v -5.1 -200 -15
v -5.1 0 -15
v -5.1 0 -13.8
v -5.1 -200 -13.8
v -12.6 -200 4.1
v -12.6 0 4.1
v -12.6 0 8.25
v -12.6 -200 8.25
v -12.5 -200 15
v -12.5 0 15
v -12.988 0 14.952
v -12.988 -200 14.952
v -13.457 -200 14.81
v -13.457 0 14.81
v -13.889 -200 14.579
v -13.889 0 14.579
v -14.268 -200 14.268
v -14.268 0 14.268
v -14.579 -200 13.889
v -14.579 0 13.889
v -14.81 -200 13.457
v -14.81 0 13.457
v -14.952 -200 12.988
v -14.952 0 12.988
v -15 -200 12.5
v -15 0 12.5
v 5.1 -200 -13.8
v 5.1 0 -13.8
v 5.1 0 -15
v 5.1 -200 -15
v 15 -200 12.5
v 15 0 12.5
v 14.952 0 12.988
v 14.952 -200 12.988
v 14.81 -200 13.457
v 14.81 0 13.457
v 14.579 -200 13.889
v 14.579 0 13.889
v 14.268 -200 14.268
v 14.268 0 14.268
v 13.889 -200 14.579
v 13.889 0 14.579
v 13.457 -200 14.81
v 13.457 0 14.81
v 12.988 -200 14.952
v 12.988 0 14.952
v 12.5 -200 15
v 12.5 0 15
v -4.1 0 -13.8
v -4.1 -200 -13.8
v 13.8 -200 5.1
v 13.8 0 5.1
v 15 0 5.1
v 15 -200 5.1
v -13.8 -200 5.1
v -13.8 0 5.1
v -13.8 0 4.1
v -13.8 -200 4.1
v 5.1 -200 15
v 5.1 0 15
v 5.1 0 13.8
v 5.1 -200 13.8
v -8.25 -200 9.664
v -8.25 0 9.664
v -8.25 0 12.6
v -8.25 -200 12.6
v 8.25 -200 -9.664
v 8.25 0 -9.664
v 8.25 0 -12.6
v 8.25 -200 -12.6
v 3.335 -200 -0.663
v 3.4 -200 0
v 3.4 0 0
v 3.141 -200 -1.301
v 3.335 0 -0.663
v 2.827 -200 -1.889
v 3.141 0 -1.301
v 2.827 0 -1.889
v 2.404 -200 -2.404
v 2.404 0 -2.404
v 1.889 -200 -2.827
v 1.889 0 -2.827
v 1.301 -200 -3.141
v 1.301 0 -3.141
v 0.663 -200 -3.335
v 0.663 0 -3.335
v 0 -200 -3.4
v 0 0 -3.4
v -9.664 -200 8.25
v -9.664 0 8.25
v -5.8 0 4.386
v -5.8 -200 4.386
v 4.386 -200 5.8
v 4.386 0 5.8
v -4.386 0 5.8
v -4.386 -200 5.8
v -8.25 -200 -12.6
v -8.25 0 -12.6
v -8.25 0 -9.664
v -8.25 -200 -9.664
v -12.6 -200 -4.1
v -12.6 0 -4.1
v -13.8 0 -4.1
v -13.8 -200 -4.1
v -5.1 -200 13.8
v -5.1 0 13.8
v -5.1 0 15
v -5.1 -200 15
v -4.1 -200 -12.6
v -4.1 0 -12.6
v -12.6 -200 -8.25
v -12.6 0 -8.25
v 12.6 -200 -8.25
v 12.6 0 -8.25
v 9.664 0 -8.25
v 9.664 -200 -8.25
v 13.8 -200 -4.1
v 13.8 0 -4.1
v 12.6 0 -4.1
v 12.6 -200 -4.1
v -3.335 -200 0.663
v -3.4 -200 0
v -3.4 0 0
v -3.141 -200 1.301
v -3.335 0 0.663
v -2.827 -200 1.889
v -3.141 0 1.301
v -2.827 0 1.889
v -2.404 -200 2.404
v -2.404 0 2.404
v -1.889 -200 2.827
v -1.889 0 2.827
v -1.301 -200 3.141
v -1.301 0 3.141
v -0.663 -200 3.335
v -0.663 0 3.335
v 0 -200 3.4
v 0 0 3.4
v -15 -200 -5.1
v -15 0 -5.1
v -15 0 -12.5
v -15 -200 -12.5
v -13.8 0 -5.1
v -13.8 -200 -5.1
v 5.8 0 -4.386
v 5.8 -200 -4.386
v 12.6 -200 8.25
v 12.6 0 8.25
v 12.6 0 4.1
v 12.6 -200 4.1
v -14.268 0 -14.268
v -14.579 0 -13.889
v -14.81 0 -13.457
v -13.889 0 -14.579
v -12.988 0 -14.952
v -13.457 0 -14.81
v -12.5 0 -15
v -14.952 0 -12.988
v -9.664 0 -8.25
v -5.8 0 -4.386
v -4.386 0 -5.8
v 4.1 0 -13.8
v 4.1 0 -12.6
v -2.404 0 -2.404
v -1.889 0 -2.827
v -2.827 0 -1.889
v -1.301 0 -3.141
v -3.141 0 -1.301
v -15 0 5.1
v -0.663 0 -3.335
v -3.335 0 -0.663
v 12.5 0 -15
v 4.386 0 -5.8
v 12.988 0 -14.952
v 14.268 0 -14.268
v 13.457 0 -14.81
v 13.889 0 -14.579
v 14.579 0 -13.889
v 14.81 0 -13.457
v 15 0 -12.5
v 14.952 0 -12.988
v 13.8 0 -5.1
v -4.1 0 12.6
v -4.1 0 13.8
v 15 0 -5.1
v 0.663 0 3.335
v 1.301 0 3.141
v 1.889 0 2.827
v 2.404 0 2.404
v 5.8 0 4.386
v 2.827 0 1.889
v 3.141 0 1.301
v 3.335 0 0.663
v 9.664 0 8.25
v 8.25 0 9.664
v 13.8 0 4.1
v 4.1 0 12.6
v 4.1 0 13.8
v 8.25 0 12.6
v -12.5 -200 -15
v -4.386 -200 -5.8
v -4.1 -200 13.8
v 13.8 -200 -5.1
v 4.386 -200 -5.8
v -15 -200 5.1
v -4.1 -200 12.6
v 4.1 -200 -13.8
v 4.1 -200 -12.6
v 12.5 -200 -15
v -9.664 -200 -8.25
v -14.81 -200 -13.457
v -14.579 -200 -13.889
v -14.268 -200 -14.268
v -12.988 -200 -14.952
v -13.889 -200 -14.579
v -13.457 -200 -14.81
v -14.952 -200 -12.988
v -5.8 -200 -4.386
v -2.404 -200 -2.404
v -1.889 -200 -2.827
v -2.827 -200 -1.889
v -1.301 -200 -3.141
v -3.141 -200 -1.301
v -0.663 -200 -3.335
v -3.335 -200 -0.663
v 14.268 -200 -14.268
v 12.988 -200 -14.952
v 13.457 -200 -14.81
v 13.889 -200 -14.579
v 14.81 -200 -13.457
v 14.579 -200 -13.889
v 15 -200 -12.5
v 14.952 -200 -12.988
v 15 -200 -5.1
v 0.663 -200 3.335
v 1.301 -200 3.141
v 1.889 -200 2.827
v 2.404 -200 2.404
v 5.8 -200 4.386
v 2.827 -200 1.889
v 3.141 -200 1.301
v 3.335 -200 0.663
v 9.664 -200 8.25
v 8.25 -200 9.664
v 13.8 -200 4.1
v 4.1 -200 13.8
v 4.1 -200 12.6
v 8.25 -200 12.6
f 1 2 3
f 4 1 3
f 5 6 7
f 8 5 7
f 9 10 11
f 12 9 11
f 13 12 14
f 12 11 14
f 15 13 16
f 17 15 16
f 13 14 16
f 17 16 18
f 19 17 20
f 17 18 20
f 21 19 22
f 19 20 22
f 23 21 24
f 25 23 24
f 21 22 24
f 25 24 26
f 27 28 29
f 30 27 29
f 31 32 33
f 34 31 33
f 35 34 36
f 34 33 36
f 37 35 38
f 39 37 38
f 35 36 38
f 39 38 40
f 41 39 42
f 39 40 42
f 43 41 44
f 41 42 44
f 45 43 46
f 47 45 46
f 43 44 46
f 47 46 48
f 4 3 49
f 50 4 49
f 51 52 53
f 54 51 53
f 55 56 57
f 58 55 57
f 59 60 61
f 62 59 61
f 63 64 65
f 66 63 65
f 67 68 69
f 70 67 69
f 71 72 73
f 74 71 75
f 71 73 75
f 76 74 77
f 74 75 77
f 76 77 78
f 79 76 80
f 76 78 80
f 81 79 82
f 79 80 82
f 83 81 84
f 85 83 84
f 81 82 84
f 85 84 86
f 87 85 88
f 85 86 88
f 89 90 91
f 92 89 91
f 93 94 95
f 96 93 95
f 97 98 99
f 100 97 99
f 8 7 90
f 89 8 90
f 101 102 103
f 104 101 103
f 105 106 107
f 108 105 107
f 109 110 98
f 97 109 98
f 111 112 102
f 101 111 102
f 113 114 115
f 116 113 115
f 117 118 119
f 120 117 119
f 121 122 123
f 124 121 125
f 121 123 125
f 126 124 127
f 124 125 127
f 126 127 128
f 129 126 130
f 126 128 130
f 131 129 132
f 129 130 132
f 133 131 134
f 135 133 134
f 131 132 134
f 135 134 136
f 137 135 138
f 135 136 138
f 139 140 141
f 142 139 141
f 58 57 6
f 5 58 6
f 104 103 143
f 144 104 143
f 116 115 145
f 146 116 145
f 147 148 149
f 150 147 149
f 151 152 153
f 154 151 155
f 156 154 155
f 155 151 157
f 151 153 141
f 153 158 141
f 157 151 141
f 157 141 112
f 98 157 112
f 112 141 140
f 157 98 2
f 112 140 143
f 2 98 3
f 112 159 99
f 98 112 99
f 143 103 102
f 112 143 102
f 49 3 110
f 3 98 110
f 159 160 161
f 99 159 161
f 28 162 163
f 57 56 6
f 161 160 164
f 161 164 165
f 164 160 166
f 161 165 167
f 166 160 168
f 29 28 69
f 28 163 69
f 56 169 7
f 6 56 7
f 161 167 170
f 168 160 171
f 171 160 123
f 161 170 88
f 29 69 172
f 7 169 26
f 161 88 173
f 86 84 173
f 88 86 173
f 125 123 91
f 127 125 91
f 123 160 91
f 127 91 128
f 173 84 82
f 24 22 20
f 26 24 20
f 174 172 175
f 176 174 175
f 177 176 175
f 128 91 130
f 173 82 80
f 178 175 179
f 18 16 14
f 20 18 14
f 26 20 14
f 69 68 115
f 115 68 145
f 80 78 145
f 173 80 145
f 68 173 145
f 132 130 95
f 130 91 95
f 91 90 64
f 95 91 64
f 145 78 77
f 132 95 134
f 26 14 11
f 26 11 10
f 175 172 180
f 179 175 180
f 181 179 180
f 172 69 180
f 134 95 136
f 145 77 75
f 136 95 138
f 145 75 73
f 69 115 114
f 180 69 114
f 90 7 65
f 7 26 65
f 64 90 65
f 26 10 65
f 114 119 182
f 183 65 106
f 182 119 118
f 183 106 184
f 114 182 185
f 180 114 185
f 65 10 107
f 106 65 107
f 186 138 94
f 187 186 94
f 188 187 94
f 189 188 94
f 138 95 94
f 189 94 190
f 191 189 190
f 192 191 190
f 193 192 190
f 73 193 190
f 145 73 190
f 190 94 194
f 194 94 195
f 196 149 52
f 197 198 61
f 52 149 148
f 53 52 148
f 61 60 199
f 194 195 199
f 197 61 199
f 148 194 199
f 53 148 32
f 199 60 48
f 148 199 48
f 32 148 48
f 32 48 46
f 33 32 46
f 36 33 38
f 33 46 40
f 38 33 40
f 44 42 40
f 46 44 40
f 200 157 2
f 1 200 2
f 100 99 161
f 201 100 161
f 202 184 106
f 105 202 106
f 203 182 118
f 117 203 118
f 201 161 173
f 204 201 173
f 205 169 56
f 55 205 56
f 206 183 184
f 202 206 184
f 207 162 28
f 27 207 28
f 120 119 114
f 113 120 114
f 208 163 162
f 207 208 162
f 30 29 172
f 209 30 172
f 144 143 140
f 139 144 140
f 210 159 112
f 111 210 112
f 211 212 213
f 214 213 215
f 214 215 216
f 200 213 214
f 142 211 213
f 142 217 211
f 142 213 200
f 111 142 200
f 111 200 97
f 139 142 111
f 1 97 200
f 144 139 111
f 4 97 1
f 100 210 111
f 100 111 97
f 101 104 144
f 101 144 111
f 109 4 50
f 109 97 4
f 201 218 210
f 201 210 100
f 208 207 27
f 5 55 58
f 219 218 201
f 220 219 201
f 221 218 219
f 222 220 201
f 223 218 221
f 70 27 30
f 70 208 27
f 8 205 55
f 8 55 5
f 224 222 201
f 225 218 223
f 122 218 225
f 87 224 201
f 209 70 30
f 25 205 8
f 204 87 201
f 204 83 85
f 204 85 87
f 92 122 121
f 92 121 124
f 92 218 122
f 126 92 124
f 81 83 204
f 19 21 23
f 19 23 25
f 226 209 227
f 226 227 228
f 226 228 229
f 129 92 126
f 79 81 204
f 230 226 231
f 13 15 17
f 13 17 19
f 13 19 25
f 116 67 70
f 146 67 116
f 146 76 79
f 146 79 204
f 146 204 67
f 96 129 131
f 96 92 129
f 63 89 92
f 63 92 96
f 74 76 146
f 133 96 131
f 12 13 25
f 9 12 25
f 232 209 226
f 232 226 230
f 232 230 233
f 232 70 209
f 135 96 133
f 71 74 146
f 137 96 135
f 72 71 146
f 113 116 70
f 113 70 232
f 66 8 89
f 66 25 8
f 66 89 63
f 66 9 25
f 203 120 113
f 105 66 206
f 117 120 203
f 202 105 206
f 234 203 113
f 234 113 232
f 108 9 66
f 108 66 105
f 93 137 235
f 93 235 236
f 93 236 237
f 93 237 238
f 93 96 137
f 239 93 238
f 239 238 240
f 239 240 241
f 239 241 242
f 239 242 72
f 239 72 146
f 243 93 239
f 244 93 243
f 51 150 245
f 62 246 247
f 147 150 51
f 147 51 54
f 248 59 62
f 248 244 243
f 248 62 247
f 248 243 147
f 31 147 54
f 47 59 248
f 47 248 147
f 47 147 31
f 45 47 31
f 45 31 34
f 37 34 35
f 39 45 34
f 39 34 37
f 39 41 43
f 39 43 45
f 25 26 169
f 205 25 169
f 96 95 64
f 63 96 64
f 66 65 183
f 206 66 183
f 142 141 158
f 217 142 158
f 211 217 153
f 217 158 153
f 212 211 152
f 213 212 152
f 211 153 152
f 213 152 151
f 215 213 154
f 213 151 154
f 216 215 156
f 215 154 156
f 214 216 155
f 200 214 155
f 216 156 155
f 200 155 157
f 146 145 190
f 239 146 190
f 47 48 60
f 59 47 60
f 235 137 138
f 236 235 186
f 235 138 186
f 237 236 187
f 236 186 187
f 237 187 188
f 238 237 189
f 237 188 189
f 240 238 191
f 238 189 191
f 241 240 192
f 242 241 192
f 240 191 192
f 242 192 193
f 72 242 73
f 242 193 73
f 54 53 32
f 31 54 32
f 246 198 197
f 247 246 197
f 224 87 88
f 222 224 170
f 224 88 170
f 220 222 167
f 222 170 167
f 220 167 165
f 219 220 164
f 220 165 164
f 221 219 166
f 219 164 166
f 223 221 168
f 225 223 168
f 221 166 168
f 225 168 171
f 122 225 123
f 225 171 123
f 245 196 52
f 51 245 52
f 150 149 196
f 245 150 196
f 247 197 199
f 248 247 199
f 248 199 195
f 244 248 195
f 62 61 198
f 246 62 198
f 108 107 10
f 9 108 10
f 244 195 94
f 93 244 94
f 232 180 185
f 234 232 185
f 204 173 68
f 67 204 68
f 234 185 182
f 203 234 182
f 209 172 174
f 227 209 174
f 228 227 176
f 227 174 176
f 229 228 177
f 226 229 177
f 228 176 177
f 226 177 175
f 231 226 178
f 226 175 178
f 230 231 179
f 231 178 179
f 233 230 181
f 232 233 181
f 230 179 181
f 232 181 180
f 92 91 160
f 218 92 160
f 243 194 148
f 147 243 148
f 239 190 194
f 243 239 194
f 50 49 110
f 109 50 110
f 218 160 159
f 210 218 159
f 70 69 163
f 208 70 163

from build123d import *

# Parameters (mm, degrees)
F1_DEPTH = 200


with BuildPart() as f1:
    # F0 (on Front) → F1 (new body)
    with BuildSketch(Plane.XZ):
        with BuildLine():
            Line((12.5, 15), (5.1, 15))
            Line((5.1, 15), (5.1, 13.8))
            Line((5.1, 13.8), (4.1, 13.8))
            Line((4.1, 13.8), (4.1, 12.6))
            Line((4.1, 12.6), (8.25, 12.6))
            Line((8.25, 12.6), (8.25, 9.664214))
            Line((8.25, 9.664214), (5.092893, 6.507107))
            Line((5.092893, 6.507107), (4.385786, 5.8))
            Line((4.385786, 5.8), (0, 5.8))
            Line((0, 5.8), (-4.385786, 5.8))
            Line((-4.385786, 5.8), (-5.092893, 6.507107))
            Line((-5.092893, 6.507107), (-8.25, 9.664214))
            Line((-8.25, 9.664214), (-8.25, 12.6))
            Line((-8.25, 12.6), (-4.1, 12.6))
            Line((-4.1, 12.6), (-4.1, 13.8))
            Line((-4.1, 13.8), (-5.1, 13.8))
            Line((-5.1, 13.8), (-5.1, 15))
            Line((-5.1, 15), (-12.5, 15))
            ThreePointArc((-12.5, 15), (-14.267767, 14.267767), (-15, 12.5))
            Line((-15, 12.5), (-15, 5.1))
            Line((-15, 5.1), (-13.8, 5.1))
            Line((-13.8, 5.1), (-13.8, 4.1))
            Line((-13.8, 4.1), (-12.6, 4.1))
            Line((-12.6, 4.1), (-12.6, 8.25))
            Line((-12.6, 8.25), (-9.664214, 8.25))
            Line((-9.664214, 8.25), (-6.507107, 5.092893))
            Line((-6.507107, 5.092893), (-5.8, 4.385786))
            Line((-5.8, 4.385786), (-5.8, 0))
            Line((-5.8, 0), (-5.8, -4.385786))
            Line((-5.8, -4.385786), (-6.507107, -5.092893))
            Line((-6.507107, -5.092893), (-9.664214, -8.25))
            Line((-9.664214, -8.25), (-12.6, -8.25))
            Line((-12.6, -8.25), (-12.6, -4.1))
            Line((-12.6, -4.1), (-13.8, -4.1))
            Line((-13.8, -4.1), (-13.8, -5.1))
            Line((-13.8, -5.1), (-15, -5.1))
            Line((-15, -5.1), (-15, -12.5))
            ThreePointArc((-15, -12.5), (-14.267767, -14.267767), (-12.5, -15))
            Line((-12.5, -15), (-5.1, -15))
            Line((-5.1, -15), (-5.1, -13.8))
            Line((-5.1, -13.8), (-4.1, -13.8))
            Line((-4.1, -13.8), (-4.1, -12.6))
            Line((-4.1, -12.6), (-8.25, -12.6))
            Line((-8.25, -12.6), (-8.25, -9.664214))
            Line((-8.25, -9.664214), (-5.092893, -6.507107))
            Line((-5.092893, -6.507107), (-4.385786, -5.8))
            Line((-4.385786, -5.8), (0, -5.8))
            Line((0, -5.8), (4.385786, -5.8))
            Line((4.385786, -5.8), (5.092893, -6.507107))
            Line((5.092893, -6.507107), (8.25, -9.664214))
            Line((8.25, -9.664214), (8.25, -12.6))
            Line((8.25, -12.6), (4.1, -12.6))
            Line((4.1, -12.6), (4.1, -13.8))
            Line((4.1, -13.8), (5.1, -13.8))
            Line((5.1, -13.8), (5.1, -15))
            Line((5.1, -15), (12.5, -15))
            ThreePointArc((12.5, -15), (14.267767, -14.267767), (15, -12.5))
            Line((15, -12.5), (15, -5.1))
            Line((15, -5.1), (13.8, -5.1))
            Line((13.8, -5.1), (13.8, -4.1))
            Line((13.8, -4.1), (12.6, -4.1))
            Line((12.6, -4.1), (12.6, -8.25))
            Line((12.6, -8.25), (9.664214, -8.25))
            Line((9.664214, -8.25), (6.507107, -5.092893))
            Line((6.507107, -5.092893), (5.8, -4.385786))
            Line((5.8, -4.385786), (5.8, 0))
            Line((5.8, 0), (5.8, 4.385786))
            Line((5.8, 4.385786), (6.507107, 5.092893))
            Line((6.507107, 5.092893), (9.664214, 8.25))
            Line((9.664214, 8.25), (12.6, 8.25))
            Line((12.6, 8.25), (12.6, 4.1))
            Line((12.6, 4.1), (13.8, 4.1))
            Line((13.8, 4.1), (13.8, 5.1))
            Line((13.8, 5.1), (15, 5.1))
            Line((15, 5.1), (15, 12.5))
            ThreePointArc((15, 12.5), (14.267767, 14.267767), (12.5, 15))
        make_face()
        with BuildLine():
            ThreePointArc((-3.4, 0), (-2.404163, 2.404163), (0, 3.4))
            ThreePointArc((0, 3.4), (2.404163, 2.404163), (3.4, 0))
            ThreePointArc((3.4, 0), (2.404163, -2.404163), (0, -3.4))
            ThreePointArc((0, -3.4), (-2.404163, -2.404163), (-3.4, 0))
        make_face(mode=Mode.SUBTRACT)
    extrude(amount=F1_DEPTH)


solid = f1.part
